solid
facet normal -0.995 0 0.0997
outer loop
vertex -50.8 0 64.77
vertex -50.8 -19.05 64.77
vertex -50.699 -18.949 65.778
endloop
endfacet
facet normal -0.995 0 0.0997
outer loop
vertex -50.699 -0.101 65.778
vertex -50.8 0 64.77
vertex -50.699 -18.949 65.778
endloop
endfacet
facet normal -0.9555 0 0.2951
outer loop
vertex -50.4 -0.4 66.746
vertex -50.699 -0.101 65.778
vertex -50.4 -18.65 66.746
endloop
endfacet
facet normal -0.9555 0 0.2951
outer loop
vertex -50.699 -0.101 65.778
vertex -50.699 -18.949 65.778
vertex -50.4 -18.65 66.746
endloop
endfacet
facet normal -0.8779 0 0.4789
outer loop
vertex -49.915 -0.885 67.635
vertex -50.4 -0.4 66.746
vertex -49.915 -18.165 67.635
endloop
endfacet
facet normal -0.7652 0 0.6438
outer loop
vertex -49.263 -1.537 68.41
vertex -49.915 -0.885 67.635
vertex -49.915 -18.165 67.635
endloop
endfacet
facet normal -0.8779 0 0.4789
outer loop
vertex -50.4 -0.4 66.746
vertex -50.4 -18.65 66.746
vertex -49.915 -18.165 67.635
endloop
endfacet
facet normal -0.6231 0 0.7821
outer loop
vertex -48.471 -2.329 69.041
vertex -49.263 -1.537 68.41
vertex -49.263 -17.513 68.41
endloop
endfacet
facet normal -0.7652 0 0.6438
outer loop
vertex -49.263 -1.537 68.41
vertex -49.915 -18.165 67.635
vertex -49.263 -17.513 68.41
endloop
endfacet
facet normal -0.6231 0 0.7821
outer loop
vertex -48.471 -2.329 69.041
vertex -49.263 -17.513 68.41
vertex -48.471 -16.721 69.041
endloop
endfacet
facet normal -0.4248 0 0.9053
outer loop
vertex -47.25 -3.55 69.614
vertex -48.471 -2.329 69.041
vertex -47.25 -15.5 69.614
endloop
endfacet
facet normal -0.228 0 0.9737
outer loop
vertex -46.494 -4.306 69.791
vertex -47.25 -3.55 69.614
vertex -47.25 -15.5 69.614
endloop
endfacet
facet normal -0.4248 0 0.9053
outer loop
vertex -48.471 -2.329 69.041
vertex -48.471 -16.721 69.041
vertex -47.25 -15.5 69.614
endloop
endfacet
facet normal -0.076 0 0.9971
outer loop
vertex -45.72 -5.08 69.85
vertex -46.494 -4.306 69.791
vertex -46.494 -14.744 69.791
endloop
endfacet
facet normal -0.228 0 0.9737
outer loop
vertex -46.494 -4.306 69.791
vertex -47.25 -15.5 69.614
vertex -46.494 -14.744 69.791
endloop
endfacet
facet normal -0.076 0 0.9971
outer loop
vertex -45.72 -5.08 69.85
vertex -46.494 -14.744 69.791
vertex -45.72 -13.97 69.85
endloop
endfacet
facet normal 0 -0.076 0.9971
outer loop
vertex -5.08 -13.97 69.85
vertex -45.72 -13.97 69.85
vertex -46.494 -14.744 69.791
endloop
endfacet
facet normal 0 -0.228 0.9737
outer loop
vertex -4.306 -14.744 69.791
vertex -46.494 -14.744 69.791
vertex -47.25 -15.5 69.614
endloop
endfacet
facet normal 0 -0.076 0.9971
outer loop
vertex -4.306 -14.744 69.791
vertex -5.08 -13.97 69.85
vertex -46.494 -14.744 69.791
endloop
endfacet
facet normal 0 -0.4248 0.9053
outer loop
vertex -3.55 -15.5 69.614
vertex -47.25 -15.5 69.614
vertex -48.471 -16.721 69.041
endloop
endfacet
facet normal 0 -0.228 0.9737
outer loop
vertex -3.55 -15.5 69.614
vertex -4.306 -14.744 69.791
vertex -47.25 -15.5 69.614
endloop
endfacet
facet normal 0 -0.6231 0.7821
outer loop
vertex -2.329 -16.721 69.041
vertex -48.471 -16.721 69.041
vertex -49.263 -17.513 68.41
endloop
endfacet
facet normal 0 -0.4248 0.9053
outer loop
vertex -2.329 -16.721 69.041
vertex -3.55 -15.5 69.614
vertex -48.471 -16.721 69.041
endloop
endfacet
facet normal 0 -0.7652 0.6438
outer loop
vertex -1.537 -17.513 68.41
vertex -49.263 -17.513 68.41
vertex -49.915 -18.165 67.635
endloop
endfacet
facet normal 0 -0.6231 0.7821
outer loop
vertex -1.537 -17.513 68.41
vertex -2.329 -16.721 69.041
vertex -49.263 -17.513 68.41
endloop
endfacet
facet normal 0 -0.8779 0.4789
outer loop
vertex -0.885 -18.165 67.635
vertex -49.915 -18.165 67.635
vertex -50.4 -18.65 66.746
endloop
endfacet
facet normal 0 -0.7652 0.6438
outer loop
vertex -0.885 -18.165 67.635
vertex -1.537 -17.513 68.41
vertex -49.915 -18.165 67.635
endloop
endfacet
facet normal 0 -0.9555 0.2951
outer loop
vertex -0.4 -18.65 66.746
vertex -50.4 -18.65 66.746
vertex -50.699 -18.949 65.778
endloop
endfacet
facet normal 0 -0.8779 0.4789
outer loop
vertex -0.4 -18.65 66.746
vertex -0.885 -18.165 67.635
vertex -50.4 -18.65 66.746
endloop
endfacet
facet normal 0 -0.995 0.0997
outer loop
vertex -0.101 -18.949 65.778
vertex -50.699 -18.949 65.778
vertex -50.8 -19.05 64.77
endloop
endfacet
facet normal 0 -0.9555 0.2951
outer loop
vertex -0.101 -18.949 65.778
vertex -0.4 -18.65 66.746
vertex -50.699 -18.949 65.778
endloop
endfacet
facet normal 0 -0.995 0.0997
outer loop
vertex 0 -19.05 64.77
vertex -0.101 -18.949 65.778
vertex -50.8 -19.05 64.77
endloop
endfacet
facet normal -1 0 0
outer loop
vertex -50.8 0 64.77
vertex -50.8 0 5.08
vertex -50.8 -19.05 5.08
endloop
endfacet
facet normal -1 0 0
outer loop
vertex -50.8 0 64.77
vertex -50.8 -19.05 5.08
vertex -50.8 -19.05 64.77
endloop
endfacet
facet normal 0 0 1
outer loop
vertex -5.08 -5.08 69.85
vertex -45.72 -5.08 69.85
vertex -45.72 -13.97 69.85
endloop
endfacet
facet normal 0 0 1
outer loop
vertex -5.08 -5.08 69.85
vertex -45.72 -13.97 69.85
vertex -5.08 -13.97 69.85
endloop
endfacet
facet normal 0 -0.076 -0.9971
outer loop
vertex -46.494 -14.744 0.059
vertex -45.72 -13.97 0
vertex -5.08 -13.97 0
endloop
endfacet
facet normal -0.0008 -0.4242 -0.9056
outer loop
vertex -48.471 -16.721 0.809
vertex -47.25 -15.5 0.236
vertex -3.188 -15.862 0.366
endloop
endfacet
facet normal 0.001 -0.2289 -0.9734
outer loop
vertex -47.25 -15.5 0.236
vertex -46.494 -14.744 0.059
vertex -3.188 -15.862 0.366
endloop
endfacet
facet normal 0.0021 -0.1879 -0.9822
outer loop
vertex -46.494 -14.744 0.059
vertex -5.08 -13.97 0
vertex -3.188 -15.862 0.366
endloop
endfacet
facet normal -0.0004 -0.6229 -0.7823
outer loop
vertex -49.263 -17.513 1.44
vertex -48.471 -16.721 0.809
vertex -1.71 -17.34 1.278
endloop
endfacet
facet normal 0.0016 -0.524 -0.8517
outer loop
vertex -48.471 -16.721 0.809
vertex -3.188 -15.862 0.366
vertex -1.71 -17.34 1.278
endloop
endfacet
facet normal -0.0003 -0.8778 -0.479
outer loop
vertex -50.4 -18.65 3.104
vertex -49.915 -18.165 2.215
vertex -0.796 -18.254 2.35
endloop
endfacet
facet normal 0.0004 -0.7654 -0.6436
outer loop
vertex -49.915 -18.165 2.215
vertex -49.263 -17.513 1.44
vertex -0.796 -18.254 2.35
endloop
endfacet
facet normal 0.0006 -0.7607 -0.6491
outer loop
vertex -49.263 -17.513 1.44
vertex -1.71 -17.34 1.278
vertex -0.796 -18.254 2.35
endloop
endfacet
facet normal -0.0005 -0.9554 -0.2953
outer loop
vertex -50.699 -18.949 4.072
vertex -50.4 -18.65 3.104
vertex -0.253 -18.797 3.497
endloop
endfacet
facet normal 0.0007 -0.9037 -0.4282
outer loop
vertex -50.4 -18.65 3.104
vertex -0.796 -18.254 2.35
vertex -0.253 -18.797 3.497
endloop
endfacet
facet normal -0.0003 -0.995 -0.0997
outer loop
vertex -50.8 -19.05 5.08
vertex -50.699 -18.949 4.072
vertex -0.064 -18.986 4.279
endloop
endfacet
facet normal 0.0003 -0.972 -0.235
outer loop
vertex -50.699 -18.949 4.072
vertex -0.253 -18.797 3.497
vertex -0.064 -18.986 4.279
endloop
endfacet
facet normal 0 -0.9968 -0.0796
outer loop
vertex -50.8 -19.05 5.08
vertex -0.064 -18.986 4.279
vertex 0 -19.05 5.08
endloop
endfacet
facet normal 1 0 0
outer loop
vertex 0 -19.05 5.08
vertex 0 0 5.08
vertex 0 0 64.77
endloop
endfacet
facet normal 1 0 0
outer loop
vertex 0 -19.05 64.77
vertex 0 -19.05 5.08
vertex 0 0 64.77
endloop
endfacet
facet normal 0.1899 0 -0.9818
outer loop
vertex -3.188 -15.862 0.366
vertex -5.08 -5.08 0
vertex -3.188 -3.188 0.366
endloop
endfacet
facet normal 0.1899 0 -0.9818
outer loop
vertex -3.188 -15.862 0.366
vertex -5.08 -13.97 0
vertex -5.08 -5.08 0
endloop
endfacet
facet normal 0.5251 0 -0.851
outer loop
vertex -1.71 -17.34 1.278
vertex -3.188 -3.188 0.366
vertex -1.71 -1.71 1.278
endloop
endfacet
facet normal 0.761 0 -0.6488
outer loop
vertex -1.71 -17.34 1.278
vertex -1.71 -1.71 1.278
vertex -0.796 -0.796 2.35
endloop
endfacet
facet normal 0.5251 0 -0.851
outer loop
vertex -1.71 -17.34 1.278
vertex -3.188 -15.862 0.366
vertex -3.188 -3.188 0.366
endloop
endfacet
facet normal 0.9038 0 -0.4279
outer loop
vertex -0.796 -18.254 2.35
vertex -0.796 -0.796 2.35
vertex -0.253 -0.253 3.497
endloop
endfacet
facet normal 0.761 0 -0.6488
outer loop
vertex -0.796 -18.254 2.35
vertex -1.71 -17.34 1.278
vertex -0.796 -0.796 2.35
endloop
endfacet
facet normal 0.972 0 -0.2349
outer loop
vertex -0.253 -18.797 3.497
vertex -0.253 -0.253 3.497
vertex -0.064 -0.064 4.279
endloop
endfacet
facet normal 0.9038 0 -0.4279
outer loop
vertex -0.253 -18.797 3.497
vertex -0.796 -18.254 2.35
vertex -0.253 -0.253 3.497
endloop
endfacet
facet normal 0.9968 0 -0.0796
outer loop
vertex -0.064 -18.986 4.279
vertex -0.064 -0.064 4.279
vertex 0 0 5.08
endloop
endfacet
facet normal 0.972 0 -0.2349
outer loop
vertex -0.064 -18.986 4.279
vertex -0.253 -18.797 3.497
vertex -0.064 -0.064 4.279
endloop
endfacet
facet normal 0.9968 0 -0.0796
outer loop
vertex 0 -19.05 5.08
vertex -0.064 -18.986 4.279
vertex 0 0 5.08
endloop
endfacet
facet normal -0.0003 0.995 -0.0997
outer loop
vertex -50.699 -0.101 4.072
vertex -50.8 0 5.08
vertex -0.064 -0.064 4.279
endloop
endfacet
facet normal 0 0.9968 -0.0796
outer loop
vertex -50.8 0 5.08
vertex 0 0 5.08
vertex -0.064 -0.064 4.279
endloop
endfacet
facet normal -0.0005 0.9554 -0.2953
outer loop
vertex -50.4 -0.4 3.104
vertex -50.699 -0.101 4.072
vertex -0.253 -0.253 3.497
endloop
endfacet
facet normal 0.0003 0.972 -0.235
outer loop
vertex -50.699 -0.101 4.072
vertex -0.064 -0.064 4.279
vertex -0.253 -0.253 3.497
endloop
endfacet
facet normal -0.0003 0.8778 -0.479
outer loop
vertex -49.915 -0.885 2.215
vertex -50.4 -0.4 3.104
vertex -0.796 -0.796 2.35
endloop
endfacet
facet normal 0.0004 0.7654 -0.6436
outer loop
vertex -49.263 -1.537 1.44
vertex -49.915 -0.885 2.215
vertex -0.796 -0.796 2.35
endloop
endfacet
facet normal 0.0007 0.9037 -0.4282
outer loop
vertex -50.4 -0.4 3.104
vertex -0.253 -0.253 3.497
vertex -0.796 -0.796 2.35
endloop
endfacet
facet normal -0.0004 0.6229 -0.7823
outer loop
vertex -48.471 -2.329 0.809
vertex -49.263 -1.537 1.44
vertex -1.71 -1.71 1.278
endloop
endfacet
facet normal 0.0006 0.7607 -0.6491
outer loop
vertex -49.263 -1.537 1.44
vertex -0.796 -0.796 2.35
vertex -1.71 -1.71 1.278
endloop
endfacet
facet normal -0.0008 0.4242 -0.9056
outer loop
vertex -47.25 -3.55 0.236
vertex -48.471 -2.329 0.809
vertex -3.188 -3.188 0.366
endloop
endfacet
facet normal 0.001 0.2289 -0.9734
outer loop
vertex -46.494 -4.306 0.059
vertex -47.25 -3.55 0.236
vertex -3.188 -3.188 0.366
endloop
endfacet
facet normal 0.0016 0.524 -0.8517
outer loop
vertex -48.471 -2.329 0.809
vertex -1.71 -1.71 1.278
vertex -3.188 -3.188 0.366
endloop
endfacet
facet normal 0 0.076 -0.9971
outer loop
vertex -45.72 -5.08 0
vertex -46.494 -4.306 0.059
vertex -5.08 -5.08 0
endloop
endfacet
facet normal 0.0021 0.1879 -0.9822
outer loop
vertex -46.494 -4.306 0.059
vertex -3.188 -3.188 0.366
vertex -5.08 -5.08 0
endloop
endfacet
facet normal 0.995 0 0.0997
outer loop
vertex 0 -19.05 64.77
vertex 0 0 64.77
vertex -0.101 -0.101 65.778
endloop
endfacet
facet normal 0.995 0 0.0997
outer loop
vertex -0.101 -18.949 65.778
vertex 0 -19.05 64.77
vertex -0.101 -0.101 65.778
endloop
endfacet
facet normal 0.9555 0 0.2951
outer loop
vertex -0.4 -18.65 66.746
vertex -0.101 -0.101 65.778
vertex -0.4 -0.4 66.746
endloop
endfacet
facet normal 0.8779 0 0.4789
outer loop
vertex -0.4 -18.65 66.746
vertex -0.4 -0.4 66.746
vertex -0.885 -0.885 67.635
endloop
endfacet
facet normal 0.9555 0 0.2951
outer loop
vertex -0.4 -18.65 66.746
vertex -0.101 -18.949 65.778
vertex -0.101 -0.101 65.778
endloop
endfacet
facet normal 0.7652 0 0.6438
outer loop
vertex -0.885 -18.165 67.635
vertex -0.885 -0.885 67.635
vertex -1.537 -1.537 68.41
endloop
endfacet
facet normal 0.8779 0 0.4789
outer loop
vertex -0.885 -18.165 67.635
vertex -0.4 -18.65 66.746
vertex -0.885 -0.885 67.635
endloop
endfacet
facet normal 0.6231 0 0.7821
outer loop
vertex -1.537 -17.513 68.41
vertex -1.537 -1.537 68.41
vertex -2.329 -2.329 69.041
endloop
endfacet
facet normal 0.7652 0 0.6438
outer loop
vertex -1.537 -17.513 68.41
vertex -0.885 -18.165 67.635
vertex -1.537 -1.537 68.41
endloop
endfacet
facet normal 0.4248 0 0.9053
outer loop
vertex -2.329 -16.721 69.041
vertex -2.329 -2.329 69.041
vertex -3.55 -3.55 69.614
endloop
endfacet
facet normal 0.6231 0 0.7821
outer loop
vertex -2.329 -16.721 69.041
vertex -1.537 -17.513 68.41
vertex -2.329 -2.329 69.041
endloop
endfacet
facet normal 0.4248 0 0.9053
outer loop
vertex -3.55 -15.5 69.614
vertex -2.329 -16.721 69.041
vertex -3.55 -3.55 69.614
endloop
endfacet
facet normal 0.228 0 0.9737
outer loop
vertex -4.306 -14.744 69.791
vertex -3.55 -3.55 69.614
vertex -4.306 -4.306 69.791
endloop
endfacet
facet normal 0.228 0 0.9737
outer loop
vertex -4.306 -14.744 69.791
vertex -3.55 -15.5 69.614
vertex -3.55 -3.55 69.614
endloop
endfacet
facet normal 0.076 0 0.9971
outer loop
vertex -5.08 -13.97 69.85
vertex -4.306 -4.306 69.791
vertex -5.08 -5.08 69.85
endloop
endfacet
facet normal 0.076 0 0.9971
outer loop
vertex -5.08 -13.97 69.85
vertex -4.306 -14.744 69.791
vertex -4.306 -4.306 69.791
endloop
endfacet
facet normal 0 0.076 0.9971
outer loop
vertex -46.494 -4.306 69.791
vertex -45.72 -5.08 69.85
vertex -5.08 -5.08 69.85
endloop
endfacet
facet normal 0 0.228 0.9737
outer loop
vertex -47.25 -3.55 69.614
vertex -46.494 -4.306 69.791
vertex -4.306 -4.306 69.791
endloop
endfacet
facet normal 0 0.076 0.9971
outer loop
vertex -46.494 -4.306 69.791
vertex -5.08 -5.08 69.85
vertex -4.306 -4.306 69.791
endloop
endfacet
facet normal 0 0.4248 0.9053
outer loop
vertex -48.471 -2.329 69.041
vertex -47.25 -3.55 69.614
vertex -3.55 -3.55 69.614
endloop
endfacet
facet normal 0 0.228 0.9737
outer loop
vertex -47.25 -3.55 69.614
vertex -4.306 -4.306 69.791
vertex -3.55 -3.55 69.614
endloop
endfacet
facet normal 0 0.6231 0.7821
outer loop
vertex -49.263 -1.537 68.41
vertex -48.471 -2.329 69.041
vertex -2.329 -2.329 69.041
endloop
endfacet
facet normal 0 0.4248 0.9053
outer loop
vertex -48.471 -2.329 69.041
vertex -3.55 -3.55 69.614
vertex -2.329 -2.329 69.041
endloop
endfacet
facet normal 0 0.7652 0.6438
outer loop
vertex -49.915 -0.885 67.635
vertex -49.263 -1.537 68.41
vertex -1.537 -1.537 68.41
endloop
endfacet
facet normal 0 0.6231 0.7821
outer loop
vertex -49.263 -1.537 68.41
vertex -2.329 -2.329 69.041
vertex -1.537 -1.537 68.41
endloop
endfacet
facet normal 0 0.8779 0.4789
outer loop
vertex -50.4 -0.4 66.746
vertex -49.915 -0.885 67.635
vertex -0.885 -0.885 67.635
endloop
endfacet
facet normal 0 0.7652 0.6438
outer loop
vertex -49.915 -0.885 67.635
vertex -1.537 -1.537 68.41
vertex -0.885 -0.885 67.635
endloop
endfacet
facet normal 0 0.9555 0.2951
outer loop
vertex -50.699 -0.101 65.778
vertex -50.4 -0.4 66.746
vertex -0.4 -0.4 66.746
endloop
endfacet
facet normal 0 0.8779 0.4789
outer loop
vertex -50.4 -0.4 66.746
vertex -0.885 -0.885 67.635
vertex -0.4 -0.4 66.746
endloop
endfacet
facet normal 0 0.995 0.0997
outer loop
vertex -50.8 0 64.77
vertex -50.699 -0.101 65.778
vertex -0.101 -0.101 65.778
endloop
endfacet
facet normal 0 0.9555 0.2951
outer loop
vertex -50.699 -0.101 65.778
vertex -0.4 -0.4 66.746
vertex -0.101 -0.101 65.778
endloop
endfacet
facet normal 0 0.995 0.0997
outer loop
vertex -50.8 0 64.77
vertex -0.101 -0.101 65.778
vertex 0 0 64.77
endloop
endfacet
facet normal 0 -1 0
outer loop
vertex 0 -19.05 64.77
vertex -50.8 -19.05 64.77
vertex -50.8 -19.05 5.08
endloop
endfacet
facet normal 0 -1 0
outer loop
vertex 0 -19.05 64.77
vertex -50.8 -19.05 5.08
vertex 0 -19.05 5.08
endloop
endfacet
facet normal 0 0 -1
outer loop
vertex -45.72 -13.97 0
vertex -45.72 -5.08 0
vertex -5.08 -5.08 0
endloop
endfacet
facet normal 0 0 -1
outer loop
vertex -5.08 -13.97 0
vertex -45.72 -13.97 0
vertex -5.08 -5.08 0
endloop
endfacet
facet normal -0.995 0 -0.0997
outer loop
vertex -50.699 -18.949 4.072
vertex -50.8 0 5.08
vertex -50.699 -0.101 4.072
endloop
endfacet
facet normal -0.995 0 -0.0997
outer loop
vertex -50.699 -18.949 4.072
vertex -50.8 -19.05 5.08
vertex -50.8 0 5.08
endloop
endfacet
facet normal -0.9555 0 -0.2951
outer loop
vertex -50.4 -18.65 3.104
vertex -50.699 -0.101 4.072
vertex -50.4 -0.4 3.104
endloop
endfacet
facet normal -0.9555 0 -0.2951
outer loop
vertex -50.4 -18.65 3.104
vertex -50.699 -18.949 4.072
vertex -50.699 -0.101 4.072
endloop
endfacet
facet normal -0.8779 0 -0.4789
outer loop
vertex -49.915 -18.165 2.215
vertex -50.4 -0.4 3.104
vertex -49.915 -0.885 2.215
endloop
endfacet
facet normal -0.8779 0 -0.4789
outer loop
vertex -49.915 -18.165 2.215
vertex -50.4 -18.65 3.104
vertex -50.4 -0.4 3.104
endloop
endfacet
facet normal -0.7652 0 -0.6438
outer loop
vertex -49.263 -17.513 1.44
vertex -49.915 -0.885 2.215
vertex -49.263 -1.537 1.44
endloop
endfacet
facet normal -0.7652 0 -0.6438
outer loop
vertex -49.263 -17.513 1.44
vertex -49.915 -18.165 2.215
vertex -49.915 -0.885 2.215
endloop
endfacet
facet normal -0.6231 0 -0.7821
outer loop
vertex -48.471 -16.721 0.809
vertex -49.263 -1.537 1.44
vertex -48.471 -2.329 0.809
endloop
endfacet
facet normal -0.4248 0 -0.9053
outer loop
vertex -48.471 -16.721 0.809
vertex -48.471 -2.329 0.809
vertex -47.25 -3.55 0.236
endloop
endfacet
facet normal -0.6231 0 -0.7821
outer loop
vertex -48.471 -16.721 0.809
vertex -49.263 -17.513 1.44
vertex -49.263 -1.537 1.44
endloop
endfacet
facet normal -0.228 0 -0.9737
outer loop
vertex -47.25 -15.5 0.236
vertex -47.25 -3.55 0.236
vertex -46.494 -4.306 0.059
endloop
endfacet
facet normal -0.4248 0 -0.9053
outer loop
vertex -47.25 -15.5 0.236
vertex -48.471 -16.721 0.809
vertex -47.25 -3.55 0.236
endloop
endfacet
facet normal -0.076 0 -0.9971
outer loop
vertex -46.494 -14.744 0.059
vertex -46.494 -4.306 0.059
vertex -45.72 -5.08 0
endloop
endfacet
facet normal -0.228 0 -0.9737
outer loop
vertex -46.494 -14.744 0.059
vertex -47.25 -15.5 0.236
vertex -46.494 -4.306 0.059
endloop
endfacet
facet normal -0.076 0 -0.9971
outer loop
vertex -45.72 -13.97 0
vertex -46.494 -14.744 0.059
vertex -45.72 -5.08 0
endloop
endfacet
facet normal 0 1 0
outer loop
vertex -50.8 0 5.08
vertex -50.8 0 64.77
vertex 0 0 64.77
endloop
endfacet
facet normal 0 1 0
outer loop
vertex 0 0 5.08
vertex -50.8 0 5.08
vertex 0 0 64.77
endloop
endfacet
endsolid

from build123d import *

# Parameters (mm, degrees)
F0_W     = 50.8
F0_H     = 69.85
F1_DEPTH = 19.05
F2_R     = 5.08
F3_R     = 5.08


with BuildPart() as f1:
    # F0 (on Front) → F1 (new body)
    with BuildSketch(Plane.XZ):
        with Locations((-25.4, 34.925)):
            Rectangle(F0_W, F0_H)
    extrude(amount=F1_DEPTH)

    # F2
    f2_edges = [f1.edges().sort_by_distance(p)[0] for p in [
        (0, -9.525, 69.85),
        (-50.8, -9.525, 69.85),
        (-25.4, 0, 69.85),
        (-25.4, -19.05, 69.85),
    ]]
    fillet(f2_edges, radius=F2_R)

    # F3
    f3_edges = [f1.edges().sort_by_distance(p)[0] for p in [
        (-50.8, -9.525, 0),
        (0, -9.525, 0),
        (-25.4, 0, 0),
        (-25.4, -19.05, 0),
    ]]
    fillet(f3_edges, radius=F3_R)


solid = f1.part
